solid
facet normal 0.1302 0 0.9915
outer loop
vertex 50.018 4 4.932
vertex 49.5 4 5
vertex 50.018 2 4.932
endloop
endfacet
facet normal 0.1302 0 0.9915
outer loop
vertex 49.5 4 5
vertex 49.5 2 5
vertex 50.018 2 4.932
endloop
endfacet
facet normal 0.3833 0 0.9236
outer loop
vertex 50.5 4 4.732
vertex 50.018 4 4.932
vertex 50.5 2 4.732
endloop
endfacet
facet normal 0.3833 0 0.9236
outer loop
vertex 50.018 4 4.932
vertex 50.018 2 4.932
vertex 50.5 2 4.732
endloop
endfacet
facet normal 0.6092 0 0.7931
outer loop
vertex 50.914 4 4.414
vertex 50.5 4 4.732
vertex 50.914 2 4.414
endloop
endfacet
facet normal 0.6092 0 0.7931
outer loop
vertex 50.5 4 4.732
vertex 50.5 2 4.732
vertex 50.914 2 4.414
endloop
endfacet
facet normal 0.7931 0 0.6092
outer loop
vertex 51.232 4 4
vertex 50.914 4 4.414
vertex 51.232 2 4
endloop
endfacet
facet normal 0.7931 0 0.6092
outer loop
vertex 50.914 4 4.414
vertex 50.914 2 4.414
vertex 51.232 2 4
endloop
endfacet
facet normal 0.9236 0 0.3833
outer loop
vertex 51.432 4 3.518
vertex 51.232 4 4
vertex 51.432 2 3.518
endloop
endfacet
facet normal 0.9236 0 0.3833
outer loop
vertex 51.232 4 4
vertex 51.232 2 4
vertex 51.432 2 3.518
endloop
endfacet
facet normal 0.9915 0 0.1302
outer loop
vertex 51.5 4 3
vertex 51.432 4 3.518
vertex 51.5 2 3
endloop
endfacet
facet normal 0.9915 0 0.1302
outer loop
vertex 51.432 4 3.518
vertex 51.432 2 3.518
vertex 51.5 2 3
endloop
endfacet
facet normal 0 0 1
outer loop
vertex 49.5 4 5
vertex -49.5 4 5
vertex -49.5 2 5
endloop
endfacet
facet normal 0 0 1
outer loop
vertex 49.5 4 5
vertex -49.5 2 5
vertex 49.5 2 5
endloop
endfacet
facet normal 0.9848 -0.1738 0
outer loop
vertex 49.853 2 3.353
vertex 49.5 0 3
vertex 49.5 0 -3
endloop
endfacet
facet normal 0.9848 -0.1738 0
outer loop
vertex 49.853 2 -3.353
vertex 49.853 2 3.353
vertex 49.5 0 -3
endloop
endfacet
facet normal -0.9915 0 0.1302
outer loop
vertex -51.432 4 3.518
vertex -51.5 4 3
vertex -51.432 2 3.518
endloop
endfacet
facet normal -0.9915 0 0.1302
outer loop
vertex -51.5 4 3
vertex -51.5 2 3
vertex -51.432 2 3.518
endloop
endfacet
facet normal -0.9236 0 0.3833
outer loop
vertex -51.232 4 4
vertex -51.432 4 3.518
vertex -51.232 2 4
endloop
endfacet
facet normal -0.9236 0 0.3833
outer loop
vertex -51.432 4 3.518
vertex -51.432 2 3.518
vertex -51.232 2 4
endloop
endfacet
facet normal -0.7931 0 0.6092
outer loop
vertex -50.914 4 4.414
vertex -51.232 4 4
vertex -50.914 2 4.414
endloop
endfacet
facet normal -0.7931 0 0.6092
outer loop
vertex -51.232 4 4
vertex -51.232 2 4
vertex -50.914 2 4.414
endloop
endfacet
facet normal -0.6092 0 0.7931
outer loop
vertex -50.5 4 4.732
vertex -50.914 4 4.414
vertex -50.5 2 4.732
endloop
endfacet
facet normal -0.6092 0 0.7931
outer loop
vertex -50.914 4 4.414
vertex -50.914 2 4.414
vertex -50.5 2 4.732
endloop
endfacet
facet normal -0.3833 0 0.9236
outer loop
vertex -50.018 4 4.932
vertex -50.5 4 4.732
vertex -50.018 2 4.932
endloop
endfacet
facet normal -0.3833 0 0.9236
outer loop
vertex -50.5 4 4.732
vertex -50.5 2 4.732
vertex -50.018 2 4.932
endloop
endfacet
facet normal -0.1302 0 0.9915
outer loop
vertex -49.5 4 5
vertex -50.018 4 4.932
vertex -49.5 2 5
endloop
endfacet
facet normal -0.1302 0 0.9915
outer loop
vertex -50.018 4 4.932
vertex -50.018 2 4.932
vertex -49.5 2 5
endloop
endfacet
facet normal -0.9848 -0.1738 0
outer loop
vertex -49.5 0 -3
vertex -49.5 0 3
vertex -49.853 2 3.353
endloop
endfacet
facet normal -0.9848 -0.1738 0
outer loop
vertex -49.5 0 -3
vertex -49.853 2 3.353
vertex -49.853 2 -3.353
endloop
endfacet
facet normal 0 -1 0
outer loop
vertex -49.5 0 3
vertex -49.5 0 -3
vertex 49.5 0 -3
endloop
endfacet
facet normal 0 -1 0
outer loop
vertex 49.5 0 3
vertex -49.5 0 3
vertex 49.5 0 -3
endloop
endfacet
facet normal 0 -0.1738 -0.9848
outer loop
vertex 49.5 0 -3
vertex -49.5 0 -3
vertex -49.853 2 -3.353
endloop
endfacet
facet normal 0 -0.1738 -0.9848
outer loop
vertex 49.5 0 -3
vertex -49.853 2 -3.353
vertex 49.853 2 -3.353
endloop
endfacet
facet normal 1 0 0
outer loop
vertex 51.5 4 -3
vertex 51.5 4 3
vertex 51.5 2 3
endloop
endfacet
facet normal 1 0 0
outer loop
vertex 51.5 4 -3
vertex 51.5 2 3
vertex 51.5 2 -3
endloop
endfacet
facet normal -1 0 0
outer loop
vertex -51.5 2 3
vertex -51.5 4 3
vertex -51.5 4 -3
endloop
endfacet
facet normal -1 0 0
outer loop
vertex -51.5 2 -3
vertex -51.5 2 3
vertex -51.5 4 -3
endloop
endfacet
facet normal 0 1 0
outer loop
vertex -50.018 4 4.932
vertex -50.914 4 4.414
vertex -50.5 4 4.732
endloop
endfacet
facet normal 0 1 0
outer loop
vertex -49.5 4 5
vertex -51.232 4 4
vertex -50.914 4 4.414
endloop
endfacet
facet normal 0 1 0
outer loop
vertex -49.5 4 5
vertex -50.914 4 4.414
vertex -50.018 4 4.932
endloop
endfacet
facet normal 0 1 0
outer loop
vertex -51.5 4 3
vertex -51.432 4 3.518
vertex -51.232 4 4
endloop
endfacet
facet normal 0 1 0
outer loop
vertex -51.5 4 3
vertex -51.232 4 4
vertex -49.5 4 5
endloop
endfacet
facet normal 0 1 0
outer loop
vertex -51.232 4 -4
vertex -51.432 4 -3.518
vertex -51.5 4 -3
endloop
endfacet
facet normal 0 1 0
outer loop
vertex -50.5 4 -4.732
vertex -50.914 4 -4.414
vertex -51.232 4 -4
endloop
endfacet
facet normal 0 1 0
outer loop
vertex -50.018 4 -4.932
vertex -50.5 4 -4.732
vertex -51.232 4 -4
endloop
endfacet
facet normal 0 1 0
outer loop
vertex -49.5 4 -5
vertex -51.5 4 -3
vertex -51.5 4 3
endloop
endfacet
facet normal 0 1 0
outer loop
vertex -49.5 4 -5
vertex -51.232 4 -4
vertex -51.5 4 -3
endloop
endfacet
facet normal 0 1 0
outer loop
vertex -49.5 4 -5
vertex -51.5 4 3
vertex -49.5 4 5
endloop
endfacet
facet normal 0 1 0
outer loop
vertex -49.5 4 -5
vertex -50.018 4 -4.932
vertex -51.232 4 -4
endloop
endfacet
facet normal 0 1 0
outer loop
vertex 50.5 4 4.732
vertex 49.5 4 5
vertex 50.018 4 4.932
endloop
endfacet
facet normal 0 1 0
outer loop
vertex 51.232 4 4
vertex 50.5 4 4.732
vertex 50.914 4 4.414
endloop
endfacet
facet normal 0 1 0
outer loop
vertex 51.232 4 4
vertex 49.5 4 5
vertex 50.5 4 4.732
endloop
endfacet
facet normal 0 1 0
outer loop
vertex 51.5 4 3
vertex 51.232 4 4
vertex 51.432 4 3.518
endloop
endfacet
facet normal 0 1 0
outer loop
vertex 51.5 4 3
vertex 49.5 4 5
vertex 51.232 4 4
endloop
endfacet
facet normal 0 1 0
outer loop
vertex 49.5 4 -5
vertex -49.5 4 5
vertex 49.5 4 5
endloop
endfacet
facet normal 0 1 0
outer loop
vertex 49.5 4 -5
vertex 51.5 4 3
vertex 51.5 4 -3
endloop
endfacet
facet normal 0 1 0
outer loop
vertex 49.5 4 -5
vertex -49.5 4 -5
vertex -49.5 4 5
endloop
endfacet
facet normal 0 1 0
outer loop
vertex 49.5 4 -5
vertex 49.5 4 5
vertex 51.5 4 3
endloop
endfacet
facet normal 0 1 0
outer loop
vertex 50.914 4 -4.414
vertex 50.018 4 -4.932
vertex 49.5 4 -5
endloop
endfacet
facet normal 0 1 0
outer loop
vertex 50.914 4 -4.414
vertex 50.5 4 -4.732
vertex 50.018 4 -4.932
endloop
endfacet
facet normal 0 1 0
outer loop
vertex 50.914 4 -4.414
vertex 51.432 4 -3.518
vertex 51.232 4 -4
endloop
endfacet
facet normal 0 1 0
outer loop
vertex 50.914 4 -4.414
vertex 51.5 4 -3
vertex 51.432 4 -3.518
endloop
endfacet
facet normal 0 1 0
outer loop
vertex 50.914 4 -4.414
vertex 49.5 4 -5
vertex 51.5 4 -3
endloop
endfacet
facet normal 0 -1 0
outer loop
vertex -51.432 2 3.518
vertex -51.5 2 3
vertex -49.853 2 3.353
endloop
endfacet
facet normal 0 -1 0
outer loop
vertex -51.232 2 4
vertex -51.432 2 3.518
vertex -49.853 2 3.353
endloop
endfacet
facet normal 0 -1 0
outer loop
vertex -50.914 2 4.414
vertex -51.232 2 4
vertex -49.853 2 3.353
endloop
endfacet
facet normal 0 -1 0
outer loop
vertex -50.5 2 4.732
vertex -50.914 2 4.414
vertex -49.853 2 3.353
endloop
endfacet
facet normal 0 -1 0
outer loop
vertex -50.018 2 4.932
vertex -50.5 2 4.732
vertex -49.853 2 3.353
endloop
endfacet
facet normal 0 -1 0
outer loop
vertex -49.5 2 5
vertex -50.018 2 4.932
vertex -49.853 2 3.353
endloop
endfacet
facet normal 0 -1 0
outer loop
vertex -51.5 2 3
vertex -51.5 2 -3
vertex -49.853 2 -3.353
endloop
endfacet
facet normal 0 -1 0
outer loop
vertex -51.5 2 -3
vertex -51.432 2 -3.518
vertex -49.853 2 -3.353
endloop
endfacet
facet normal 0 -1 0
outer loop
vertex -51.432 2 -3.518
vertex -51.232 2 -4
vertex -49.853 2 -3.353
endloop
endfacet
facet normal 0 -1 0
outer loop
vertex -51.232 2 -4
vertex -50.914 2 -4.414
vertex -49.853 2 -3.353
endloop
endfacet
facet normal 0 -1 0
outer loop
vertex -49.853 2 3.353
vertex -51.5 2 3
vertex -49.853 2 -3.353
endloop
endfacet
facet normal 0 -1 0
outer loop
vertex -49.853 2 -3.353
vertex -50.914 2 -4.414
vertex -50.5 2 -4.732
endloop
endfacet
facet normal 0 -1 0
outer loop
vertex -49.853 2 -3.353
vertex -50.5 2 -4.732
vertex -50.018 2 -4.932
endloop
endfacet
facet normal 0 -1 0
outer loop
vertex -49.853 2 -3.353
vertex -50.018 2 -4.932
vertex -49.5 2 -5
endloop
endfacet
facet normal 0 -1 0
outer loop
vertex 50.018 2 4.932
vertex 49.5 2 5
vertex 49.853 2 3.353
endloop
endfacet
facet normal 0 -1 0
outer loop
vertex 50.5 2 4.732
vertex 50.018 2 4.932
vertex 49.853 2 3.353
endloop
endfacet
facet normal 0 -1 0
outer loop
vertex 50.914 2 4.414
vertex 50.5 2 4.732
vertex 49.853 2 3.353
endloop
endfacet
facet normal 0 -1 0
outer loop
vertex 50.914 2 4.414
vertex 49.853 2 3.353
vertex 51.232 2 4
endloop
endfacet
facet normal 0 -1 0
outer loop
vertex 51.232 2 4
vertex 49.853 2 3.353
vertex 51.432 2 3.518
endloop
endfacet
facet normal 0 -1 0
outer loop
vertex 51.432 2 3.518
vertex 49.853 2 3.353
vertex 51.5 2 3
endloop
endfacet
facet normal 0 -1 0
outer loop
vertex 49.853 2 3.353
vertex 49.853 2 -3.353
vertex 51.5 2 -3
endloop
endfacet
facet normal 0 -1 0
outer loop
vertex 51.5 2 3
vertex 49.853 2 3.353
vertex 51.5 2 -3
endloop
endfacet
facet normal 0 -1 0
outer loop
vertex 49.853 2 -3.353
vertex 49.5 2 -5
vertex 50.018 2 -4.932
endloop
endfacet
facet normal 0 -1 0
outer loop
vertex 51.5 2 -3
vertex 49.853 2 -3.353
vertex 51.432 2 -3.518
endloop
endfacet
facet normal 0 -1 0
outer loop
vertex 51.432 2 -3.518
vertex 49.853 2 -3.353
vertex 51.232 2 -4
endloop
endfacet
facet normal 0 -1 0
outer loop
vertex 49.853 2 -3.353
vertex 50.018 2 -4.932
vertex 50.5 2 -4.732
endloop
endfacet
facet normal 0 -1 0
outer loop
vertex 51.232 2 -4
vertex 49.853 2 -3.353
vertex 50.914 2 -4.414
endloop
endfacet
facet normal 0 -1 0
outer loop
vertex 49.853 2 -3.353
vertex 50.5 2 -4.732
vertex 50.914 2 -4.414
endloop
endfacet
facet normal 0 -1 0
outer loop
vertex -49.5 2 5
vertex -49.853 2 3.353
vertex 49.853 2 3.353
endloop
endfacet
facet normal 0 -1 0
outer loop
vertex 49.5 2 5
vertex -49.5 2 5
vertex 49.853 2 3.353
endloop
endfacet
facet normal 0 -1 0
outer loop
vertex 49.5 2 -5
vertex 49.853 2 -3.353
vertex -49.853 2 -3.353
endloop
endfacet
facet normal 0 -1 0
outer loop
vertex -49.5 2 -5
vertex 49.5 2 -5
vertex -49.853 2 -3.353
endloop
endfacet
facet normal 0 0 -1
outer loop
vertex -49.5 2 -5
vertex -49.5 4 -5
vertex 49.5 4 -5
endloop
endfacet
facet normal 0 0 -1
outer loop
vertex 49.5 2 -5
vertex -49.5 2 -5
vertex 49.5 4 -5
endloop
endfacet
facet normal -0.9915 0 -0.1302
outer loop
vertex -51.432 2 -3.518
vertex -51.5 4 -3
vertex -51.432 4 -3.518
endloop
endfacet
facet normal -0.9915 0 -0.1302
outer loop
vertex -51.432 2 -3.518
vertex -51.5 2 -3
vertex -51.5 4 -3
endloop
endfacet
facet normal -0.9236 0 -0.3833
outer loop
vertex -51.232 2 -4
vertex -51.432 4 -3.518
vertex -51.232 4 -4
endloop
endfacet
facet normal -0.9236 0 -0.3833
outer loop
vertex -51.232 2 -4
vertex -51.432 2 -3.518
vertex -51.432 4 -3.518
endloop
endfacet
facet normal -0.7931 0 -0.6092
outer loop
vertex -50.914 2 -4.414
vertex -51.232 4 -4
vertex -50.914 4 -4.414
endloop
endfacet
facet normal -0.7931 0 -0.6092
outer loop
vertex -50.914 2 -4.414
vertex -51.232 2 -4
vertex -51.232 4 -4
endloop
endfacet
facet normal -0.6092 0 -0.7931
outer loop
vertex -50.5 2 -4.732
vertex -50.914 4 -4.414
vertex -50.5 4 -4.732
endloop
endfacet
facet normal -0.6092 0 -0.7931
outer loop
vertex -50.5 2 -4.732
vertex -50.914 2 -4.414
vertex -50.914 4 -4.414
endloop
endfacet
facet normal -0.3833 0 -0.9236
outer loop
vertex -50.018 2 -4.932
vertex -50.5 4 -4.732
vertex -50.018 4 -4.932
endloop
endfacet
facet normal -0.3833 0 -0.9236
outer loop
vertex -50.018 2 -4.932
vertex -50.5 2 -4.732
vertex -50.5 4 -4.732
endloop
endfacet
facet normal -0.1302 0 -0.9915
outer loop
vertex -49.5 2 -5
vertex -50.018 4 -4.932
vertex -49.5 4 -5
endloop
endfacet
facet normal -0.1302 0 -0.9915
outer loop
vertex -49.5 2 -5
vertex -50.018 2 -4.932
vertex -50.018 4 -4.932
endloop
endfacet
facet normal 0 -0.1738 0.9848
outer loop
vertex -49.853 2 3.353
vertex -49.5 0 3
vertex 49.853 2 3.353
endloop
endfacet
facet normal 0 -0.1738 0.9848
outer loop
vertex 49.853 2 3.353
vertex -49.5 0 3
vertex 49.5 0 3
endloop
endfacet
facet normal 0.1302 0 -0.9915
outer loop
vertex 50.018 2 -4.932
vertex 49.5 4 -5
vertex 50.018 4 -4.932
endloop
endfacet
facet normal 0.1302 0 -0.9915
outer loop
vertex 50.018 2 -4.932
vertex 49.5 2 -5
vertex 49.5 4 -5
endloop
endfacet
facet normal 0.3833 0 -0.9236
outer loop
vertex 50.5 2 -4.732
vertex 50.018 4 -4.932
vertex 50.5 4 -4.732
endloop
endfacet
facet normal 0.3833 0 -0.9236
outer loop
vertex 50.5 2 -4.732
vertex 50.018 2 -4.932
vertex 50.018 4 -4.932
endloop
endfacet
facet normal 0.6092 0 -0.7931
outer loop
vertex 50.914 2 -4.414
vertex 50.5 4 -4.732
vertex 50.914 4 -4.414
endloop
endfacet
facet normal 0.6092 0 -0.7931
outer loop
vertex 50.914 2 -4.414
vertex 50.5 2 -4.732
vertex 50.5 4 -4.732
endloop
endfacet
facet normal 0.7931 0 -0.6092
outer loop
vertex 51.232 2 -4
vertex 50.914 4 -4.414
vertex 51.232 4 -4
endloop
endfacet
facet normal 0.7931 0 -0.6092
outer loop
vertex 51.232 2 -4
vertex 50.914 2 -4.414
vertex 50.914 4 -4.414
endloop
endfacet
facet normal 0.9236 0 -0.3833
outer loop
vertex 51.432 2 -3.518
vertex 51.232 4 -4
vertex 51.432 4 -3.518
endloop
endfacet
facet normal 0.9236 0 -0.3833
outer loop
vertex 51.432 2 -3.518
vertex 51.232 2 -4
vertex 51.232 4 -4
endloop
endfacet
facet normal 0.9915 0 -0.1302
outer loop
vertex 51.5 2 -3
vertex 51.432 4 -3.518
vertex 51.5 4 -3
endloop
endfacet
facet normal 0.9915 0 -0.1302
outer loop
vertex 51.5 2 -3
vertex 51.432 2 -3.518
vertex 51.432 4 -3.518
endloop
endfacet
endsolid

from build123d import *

# Parameters (mm, degrees)
SKETCH1_W           = 99
SKETCH1_H           = 6
BOSS_EXTRUDE1_DEPTH = 2
SKETCH2_W           = 101
SKETCH2_H           = 8
BOSS_EXTRUDE3_DEPTH = 2
DRAFT1_ANGLE        = 10
SKETCH3_W           = 103
SKETCH3_H           = 10
BOSS_EXTRUDE4_DEPTH = 2
FILLET1_R           = 2


with BuildPart() as part:
    # Sketch1 → Boss-Extrude1 (new body)
    with BuildSketch(Plane(origin=(0, 0, 0), x_dir=(1, 0, 0), z_dir=(0, 1, 0))):
        Rectangle(SKETCH1_W, SKETCH1_H)
    extrude(amount=BOSS_EXTRUDE1_DEPTH)

    # Draft1
    draft1_faces = [part.faces().sort_by_distance(p)[0] for p in [
        (49.5, 1, 0),
        (0, 1, 3),
        (-49.5, 1, 0),
        (0, 1, -3),
    ]]
    draft(draft1_faces, Plane(origin=(0, 0, 0), x_dir=(0, 0, -1), z_dir=(0, -1, 0)), DRAFT1_ANGLE)



with BuildPart() as body_2:
    # Sketch2 → Boss-Extrude3 (new body)
    with BuildSketch(Plane(origin=(0, 2, 0), x_dir=(1, 0, 0), z_dir=(0, 1, 0))):
        Rectangle(SKETCH2_W, SKETCH2_H)
    extrude(amount=BOSS_EXTRUDE3_DEPTH)


with BuildPart() as part_1:
    add(part.part)

    add(body_2.part)  # Boss-Extrude4 merges body 2
    # Sketch3 → Boss-Extrude4 (add)
    with BuildSketch(Plane(origin=(0, 4, 0), x_dir=(1, 0, 0), z_dir=(0, 1, 0))):
        Rectangle(SKETCH3_W, SKETCH3_H)
    extrude(amount=-BOSS_EXTRUDE4_DEPTH)

    # Fillet1
    fillet1_edges = [part_1.edges().sort_by_distance(p)[0] for p in [
        (-51.5, 3, 5),
        (-51.5, 3, -5),
        (51.5, 3, -5),
        (51.5, 3, 5),
    ]]
    fillet(fillet1_edges, radius=FILLET1_R)


solid = part_1.part
